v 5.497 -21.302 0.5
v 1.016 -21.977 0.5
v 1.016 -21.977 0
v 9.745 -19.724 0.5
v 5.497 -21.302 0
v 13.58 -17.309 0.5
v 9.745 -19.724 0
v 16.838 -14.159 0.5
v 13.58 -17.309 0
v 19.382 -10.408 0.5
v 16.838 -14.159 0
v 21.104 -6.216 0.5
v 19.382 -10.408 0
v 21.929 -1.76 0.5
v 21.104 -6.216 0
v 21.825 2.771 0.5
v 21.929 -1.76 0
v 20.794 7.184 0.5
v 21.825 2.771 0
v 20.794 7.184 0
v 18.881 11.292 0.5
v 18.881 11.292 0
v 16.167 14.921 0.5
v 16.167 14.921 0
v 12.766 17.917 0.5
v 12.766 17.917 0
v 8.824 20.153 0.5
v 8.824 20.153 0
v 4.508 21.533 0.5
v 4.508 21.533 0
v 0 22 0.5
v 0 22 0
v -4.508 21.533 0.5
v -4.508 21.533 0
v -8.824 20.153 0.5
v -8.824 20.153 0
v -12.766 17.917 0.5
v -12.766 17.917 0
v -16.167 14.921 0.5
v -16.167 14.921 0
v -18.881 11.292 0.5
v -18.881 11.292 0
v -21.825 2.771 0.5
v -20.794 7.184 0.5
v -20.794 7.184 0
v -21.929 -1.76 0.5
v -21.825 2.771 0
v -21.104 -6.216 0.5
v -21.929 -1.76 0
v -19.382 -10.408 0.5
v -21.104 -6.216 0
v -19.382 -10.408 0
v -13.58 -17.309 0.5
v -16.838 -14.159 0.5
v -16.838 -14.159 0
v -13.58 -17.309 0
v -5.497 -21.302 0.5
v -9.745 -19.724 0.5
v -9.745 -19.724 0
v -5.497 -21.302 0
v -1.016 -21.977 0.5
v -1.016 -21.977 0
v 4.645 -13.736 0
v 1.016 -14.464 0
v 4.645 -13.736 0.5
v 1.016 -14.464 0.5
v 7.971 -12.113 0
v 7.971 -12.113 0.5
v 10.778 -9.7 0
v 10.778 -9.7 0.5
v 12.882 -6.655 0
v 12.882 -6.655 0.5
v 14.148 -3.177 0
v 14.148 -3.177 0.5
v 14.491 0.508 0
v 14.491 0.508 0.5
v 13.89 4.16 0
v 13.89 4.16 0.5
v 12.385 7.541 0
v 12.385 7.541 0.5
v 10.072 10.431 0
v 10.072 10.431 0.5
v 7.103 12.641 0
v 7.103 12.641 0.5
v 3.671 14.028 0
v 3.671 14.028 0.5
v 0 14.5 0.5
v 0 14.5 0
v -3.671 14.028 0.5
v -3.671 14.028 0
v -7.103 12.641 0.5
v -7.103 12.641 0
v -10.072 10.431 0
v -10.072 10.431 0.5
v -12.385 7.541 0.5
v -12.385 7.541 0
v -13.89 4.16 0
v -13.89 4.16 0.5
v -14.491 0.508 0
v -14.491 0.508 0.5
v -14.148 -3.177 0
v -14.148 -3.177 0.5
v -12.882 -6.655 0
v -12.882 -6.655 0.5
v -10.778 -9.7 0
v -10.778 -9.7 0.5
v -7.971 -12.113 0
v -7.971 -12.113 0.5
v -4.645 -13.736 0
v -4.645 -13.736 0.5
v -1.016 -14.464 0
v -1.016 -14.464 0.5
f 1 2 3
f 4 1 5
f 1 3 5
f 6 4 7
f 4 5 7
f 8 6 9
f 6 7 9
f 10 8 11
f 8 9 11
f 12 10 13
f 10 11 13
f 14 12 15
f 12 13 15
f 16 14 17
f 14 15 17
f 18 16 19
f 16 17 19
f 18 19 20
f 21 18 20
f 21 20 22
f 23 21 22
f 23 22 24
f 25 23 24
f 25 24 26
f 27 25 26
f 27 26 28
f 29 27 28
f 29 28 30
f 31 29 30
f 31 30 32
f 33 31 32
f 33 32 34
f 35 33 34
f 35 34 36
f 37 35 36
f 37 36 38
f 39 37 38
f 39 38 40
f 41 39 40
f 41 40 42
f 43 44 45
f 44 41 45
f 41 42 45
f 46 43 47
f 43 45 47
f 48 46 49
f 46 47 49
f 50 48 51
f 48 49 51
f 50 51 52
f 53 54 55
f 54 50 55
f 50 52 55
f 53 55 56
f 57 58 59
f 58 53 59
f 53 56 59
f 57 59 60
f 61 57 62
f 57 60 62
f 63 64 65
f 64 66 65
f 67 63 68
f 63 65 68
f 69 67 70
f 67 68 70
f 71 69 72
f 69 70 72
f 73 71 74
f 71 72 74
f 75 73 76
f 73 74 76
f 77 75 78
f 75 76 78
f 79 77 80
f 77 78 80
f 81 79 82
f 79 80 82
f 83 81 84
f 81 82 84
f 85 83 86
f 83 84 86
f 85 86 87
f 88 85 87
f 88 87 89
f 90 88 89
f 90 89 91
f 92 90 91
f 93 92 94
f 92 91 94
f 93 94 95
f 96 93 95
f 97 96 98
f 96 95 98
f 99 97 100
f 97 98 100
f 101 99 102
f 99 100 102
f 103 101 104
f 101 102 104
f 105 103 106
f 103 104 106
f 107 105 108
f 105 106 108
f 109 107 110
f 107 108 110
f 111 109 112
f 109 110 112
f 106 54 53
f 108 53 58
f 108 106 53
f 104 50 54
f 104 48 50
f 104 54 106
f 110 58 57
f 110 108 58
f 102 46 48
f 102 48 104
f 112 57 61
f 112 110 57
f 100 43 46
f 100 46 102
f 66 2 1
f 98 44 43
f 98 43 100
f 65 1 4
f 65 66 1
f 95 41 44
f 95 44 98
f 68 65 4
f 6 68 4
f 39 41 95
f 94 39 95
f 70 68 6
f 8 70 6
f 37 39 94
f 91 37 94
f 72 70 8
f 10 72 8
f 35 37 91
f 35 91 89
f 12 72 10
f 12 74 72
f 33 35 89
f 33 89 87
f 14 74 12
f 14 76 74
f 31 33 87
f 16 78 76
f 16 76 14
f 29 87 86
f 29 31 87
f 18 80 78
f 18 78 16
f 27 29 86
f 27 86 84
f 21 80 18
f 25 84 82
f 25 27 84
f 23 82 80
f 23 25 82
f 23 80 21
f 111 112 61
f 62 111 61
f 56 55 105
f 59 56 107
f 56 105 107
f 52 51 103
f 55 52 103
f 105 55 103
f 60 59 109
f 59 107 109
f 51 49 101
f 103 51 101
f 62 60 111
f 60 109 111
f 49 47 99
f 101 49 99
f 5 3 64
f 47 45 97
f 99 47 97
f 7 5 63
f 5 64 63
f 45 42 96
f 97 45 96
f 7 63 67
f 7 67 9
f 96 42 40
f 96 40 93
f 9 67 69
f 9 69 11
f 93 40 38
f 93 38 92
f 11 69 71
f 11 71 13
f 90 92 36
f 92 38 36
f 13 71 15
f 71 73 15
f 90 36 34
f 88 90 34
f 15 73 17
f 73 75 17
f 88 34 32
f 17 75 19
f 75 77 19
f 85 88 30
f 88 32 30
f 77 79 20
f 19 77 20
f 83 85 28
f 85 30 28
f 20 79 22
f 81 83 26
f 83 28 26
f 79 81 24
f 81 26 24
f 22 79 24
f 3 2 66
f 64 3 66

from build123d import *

# Parameters (mm, degrees)
F0_R     = 22
F1_DEPTH = 0.5
F2_R     = 14.5
F3_DEPTH = 25
F5_DEPTH = 25


with BuildPart() as f1:
    # F0 (on Top) → F1 (new body)
    with BuildSketch(Plane.XY):
        Circle(F0_R)
    extrude(amount=F1_DEPTH)

    # F2 (on face) → F3 (cut)
    with BuildSketch(Plane.XY.offset(0.5)):
        Circle(F2_R)
    extrude(amount=-F3_DEPTH, mode=Mode.SUBTRACT)

    # F4 (on face) → F5 (cut)
    with BuildSketch(Plane.XY.offset(0.5)):
        with BuildLine():
            ThreePointArc((-1.0157200741, -21.9765400537), (0, -22), (1.0157200741, -21.9765400537))
            Line((1.0157200741, -21.9765400537), (1.0157200741, -14.4643808278))
            ThreePointArc((1.0157200741, -14.4643808278), (0, -14.5), (-1.0157200741, -14.4643808278))
            Line((-1.0157200741, -14.4643808278), (-1.0157200741, -21.9765400537))
        make_face()
    extrude(amount=-F5_DEPTH, mode=Mode.SUBTRACT)


solid = f1.part
